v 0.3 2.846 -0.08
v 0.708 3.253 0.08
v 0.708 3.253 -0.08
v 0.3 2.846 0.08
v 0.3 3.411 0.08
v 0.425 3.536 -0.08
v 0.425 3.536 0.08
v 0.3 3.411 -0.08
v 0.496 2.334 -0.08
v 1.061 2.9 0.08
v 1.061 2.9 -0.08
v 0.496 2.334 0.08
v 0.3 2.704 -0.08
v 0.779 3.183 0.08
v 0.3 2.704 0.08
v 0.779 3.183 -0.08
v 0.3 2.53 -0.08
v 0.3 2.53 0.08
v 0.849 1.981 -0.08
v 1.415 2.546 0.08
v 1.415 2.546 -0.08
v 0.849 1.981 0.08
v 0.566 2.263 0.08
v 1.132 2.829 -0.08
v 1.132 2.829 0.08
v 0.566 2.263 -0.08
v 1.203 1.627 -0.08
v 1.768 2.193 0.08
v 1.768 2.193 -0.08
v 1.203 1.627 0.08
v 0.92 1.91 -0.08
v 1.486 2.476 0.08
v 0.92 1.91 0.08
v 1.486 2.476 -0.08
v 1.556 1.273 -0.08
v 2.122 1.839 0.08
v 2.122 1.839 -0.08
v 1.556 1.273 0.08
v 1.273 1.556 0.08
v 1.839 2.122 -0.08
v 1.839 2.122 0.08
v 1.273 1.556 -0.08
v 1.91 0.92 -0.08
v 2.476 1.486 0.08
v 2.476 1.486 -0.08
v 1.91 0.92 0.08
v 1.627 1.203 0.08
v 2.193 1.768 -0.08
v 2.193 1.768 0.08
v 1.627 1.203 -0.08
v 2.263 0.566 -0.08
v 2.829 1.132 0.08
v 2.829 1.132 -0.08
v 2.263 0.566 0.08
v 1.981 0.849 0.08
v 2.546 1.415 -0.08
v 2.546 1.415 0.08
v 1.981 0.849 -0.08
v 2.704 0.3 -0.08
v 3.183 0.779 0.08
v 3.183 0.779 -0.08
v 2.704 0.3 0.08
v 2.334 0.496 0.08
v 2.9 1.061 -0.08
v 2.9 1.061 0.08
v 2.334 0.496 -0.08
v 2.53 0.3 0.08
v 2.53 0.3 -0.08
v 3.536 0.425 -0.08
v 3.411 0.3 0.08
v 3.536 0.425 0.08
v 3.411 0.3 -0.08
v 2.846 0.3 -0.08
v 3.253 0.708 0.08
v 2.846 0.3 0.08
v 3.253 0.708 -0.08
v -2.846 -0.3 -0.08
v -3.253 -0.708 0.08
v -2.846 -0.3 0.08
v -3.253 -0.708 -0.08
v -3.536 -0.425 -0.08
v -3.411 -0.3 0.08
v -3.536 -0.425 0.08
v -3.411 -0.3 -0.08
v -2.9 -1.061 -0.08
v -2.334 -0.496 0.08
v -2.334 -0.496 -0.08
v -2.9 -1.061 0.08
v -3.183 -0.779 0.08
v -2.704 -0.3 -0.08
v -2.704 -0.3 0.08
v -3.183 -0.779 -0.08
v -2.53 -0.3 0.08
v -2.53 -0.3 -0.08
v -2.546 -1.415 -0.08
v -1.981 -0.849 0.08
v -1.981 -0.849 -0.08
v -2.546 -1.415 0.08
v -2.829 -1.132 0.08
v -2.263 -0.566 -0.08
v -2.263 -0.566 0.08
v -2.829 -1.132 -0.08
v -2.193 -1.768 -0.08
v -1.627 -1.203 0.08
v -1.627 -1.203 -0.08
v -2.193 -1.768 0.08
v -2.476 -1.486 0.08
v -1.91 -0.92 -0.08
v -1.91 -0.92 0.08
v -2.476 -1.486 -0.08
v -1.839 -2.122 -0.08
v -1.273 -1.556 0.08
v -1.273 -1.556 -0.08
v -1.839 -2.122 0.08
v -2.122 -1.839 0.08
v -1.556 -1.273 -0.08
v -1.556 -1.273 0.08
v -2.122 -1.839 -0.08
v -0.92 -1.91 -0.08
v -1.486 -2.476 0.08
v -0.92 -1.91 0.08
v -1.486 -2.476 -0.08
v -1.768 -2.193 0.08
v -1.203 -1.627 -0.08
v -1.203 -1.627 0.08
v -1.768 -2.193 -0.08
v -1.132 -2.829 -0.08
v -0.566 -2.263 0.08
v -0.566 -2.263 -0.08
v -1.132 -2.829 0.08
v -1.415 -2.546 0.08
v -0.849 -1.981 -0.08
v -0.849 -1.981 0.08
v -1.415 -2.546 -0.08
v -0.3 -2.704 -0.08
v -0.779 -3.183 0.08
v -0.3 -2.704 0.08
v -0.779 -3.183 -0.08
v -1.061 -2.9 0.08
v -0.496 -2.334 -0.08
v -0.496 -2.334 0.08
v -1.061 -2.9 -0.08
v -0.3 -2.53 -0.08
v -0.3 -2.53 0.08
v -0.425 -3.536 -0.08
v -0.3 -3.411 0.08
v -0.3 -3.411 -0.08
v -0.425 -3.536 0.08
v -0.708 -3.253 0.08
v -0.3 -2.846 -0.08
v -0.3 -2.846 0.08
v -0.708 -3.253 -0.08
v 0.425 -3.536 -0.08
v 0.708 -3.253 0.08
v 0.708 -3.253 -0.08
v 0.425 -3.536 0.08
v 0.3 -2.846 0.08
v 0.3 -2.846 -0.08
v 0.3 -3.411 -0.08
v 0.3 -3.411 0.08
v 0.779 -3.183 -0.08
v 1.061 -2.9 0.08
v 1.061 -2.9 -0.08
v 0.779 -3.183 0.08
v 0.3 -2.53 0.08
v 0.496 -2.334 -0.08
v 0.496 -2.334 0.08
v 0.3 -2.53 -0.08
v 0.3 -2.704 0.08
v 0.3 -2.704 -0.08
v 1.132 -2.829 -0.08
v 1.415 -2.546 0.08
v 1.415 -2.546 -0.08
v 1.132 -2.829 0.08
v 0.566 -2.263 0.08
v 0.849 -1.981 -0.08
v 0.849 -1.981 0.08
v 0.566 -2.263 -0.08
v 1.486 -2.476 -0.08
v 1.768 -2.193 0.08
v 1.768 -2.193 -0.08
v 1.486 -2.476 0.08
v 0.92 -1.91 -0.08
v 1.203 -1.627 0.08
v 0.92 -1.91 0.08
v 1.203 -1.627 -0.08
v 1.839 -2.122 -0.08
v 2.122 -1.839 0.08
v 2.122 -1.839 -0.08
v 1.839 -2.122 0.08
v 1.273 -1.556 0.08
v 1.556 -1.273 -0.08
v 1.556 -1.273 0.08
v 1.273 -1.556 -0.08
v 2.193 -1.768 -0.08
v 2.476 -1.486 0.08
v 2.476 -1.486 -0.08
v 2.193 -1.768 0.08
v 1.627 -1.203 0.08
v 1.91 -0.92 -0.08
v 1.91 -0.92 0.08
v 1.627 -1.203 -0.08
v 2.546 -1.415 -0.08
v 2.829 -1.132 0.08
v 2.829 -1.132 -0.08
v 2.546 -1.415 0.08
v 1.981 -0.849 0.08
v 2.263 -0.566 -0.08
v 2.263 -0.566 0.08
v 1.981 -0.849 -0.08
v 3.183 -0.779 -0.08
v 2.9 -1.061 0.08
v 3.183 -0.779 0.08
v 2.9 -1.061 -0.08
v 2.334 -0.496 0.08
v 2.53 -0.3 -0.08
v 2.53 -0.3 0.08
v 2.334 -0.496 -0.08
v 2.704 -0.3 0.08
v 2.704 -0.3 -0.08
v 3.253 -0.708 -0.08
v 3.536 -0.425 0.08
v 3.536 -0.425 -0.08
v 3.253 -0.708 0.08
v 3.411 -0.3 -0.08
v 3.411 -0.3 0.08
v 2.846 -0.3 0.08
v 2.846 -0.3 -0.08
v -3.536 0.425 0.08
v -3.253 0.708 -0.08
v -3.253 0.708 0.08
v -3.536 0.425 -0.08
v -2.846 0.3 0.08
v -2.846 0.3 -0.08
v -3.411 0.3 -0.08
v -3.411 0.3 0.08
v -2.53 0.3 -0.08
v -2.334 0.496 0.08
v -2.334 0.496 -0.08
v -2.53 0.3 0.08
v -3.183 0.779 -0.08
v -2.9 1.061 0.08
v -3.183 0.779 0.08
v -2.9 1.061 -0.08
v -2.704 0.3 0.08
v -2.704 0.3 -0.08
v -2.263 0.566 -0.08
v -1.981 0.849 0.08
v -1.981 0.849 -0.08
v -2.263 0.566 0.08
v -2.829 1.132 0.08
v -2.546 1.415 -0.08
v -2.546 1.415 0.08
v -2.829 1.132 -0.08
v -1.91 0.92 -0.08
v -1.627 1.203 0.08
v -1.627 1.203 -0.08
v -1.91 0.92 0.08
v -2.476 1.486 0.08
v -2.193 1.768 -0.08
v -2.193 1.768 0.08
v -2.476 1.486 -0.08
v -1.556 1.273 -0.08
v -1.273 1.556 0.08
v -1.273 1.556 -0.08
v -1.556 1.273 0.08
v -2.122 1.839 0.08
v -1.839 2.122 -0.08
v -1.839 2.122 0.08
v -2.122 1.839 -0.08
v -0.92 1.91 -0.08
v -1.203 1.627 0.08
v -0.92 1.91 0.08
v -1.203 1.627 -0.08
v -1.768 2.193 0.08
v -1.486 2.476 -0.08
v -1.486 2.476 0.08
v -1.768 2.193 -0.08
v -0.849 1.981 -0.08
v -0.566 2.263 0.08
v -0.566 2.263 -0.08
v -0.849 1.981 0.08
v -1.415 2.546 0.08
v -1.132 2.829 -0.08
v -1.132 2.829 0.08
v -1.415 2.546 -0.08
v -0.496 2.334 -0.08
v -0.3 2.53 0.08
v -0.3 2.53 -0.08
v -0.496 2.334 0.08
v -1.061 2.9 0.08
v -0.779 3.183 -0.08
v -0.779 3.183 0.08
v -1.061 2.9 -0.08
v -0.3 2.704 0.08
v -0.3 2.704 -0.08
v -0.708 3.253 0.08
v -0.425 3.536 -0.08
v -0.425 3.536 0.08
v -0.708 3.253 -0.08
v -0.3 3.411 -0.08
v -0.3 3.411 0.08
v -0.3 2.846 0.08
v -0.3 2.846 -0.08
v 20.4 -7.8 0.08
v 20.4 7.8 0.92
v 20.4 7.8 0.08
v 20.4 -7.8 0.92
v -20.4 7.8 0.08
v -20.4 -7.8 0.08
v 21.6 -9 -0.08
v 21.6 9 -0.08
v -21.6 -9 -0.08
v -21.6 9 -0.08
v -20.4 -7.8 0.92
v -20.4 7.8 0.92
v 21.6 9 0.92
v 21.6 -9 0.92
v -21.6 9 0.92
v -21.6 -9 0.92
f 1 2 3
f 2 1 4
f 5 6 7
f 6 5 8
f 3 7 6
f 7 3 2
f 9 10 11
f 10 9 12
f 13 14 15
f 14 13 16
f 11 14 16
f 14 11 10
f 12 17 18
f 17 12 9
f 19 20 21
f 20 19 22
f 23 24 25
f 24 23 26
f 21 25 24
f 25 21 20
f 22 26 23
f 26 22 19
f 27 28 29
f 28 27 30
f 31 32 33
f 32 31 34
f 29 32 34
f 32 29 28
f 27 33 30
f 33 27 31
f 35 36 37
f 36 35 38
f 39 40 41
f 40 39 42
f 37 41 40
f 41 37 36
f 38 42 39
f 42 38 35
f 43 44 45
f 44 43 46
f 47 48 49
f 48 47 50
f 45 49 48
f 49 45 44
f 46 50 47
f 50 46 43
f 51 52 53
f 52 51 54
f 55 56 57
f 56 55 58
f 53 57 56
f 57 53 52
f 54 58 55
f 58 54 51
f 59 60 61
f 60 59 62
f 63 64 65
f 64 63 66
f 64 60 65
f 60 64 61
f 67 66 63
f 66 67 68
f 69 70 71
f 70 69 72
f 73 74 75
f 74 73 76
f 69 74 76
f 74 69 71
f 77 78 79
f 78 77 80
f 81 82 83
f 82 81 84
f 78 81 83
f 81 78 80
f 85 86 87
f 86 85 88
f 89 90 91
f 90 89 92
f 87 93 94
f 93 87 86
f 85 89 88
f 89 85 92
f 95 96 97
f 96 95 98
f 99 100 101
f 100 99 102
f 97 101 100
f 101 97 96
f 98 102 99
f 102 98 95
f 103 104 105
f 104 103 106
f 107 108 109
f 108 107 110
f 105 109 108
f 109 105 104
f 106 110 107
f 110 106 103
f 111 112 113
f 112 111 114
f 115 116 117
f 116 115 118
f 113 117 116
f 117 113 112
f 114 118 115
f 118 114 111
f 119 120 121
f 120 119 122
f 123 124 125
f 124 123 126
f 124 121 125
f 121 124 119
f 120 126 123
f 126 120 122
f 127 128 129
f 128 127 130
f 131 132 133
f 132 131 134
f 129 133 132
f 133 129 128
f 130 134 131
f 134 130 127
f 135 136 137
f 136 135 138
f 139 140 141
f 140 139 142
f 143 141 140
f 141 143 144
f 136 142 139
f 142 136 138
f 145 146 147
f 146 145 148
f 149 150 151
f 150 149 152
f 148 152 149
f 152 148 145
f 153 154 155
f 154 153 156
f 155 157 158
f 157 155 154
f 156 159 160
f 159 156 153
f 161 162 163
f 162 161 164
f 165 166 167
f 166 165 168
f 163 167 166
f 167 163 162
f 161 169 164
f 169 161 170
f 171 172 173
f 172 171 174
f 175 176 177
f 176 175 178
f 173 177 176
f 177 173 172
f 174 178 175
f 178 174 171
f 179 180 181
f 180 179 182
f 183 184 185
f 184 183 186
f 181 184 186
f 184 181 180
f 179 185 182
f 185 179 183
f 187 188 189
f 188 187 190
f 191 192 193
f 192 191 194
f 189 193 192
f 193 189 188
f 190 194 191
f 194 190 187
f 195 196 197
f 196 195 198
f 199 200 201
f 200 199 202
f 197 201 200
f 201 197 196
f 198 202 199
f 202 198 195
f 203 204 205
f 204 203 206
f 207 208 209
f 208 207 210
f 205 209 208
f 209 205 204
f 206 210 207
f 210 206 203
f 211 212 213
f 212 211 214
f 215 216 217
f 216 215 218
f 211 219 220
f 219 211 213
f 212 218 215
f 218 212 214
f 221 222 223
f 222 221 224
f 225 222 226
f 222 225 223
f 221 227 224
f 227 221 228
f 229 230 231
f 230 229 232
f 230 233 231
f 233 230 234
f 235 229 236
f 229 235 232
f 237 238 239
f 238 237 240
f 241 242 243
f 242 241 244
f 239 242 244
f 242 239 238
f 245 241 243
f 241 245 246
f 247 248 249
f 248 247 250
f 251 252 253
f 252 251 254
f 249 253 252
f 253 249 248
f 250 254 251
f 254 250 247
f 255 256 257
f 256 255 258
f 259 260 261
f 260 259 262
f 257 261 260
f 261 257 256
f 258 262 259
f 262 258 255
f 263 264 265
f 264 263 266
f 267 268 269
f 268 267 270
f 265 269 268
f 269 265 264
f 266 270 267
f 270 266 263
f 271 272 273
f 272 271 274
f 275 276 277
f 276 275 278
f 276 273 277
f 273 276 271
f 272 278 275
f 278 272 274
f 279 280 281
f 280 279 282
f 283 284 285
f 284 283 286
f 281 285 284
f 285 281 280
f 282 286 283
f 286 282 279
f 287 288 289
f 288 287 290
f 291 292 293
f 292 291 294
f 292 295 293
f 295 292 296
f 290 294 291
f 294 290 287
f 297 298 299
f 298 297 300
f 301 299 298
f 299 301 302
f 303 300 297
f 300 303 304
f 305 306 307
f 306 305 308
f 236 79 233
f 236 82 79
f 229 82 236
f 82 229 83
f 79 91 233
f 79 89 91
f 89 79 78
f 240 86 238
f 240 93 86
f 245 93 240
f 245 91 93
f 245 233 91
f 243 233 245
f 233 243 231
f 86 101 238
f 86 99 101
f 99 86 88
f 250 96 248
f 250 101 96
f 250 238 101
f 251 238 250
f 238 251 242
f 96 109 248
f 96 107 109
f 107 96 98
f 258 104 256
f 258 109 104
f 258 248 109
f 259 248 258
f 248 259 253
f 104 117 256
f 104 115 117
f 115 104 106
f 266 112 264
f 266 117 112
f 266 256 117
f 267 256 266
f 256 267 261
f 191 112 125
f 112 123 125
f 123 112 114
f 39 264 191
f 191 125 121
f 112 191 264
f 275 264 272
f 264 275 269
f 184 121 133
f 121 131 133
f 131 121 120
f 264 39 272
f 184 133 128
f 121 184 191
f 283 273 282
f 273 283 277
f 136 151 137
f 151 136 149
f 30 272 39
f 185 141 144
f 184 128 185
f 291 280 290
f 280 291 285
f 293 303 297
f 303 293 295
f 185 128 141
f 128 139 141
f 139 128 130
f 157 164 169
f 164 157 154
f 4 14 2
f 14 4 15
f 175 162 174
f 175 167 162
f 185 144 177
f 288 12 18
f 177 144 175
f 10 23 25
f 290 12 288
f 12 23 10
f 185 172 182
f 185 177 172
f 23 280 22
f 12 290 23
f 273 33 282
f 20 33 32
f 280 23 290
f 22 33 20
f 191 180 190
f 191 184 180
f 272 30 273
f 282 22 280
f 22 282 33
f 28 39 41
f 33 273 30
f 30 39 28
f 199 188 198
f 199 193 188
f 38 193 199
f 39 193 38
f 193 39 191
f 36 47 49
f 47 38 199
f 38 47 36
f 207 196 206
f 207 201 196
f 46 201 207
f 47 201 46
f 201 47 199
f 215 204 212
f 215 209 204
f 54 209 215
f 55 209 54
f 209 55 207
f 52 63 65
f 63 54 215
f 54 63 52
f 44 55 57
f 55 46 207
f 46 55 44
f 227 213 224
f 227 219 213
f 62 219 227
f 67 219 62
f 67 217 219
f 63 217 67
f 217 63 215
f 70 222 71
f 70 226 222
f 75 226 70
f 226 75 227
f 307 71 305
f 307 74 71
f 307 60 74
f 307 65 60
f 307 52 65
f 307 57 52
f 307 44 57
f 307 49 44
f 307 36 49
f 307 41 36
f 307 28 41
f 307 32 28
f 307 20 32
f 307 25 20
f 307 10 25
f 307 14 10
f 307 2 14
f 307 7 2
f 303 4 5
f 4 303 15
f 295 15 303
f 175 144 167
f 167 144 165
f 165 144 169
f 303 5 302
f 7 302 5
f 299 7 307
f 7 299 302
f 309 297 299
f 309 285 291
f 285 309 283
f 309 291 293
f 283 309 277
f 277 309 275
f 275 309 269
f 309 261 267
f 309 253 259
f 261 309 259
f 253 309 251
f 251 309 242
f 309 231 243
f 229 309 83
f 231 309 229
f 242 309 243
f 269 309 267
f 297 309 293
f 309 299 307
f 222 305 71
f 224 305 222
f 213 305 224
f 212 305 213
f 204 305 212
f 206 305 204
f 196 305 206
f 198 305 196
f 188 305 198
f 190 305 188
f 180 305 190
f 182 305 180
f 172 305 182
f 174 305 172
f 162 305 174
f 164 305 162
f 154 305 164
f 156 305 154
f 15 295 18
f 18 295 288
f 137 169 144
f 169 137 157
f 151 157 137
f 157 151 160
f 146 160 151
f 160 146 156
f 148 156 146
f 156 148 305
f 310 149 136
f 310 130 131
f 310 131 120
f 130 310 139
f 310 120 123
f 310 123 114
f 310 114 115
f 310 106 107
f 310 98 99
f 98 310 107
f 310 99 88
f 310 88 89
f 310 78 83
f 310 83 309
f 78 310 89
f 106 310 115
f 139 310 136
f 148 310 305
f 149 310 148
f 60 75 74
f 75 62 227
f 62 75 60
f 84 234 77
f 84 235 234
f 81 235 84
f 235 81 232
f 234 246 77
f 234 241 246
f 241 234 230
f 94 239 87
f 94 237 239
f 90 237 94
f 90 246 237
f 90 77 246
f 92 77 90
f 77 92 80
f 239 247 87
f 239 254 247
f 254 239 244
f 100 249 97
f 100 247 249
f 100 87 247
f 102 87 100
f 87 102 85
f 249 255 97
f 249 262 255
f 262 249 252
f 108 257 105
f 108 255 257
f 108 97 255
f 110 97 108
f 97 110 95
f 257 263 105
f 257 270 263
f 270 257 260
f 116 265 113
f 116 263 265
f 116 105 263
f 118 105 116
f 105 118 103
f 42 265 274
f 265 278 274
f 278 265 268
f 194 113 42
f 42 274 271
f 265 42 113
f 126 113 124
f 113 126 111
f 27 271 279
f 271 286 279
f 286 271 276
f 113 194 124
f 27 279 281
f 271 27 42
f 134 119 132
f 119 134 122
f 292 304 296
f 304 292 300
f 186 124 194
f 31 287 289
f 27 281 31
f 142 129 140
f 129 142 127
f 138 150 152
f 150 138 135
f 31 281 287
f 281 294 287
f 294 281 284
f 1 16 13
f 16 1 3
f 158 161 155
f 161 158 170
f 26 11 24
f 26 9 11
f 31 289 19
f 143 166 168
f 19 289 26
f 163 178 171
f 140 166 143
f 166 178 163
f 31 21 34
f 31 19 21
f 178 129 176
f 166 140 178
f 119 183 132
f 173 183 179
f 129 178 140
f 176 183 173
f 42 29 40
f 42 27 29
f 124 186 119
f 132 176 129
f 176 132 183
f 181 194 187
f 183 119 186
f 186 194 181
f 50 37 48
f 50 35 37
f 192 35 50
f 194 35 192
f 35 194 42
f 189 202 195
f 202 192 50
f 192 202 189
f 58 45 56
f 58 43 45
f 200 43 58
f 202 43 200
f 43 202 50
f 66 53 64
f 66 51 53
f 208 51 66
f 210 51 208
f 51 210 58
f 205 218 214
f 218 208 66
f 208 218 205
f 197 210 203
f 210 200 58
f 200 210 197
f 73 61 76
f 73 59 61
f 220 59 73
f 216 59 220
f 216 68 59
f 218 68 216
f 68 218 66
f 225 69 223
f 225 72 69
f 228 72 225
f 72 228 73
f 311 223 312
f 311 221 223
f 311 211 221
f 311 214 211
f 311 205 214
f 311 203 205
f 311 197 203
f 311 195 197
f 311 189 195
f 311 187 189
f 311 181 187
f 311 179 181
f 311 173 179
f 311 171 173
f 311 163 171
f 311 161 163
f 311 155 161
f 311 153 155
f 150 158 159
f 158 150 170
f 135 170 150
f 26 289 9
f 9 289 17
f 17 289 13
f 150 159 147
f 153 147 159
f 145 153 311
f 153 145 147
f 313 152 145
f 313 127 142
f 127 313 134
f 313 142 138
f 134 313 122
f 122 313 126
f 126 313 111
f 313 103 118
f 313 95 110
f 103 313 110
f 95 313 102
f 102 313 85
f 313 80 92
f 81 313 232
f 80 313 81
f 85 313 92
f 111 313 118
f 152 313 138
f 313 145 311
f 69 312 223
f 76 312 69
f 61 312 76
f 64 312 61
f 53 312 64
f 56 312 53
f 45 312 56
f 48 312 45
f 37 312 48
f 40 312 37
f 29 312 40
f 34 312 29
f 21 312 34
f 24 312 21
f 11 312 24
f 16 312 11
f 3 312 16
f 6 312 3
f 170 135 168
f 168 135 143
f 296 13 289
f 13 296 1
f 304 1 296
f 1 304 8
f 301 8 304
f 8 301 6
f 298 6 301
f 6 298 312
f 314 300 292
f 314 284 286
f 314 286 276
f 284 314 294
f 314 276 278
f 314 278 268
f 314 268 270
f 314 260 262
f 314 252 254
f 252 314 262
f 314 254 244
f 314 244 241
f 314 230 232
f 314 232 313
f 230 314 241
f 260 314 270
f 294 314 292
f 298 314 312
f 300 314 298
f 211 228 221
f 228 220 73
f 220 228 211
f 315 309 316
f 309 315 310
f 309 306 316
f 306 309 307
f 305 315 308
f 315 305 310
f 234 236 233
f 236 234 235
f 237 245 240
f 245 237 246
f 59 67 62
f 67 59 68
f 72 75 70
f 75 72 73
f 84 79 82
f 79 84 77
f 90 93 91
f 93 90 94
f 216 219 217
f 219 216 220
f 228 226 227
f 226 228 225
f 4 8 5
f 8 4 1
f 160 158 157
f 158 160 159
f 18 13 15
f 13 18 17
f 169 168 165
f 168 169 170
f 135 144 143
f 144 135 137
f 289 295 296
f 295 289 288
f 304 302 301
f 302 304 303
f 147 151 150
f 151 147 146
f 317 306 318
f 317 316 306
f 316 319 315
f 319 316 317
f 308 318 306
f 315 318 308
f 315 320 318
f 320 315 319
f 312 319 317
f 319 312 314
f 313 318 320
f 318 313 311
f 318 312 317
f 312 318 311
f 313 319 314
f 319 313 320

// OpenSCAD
$fa = 0.1;
$fs = 0.1;
length = 40.8;
height = 15.6;
thickness = .16;
padwidth = .4;
padlength = .8;
lipheight = 1;
lipwidth = 1.2;
difference() {
cube([length,height,thickness],center=true);
translate([0,0,0]) {
rotate([0,0,-45]) {
    //difference() {
        //cube([5.8, 5.8,thickness+.01],center=true);
        union() {
            for (i = [-2:.5:2]) {
                translate([i,2.401,0]) {
                    cube([padwidth,padlength,thickness+.02],center=true);
                }
            }
            for (i = [-2:.5:2]) {
                translate([i,-2.401,0]) {
                    cube([padwidth,padlength,thickness+.02],center=true);
                }
            }
            for (i = [-2:.5:2]) {
                translate([2.401,i,0]) {
                    cube([padlength,padwidth,thickness+.02],center=true);
                }
            }
            for (i = [-2:.5:2]) {
                translate([-2.401,i,0]) {
                    cube([padlength,padwidth,thickness+.02],center=true);
                }
            }
        }
        //}
        
    
}
}
}
cube([8, .6, thickness], center=true);
cube([.6, 8, thickness], center=true);
translate([-length/2,height/2,-thickness/2]) {
    cube([length, lipwidth, lipheight]);
}
translate([-length/2,-height/2 - lipwidth,-thickness/2]) {
    cube([length, lipwidth, lipheight]);
}
translate([length/2,-height/2 - lipwidth,-thickness/2]) {
    cube([lipwidth, height + 2 * lipwidth, lipheight]);
}
translate([- length/2 - lipwidth,-height/2 - lipwidth,-thickness/2]) {
    cube([lipwidth, height + 2 * lipwidth, lipheight]);
}
